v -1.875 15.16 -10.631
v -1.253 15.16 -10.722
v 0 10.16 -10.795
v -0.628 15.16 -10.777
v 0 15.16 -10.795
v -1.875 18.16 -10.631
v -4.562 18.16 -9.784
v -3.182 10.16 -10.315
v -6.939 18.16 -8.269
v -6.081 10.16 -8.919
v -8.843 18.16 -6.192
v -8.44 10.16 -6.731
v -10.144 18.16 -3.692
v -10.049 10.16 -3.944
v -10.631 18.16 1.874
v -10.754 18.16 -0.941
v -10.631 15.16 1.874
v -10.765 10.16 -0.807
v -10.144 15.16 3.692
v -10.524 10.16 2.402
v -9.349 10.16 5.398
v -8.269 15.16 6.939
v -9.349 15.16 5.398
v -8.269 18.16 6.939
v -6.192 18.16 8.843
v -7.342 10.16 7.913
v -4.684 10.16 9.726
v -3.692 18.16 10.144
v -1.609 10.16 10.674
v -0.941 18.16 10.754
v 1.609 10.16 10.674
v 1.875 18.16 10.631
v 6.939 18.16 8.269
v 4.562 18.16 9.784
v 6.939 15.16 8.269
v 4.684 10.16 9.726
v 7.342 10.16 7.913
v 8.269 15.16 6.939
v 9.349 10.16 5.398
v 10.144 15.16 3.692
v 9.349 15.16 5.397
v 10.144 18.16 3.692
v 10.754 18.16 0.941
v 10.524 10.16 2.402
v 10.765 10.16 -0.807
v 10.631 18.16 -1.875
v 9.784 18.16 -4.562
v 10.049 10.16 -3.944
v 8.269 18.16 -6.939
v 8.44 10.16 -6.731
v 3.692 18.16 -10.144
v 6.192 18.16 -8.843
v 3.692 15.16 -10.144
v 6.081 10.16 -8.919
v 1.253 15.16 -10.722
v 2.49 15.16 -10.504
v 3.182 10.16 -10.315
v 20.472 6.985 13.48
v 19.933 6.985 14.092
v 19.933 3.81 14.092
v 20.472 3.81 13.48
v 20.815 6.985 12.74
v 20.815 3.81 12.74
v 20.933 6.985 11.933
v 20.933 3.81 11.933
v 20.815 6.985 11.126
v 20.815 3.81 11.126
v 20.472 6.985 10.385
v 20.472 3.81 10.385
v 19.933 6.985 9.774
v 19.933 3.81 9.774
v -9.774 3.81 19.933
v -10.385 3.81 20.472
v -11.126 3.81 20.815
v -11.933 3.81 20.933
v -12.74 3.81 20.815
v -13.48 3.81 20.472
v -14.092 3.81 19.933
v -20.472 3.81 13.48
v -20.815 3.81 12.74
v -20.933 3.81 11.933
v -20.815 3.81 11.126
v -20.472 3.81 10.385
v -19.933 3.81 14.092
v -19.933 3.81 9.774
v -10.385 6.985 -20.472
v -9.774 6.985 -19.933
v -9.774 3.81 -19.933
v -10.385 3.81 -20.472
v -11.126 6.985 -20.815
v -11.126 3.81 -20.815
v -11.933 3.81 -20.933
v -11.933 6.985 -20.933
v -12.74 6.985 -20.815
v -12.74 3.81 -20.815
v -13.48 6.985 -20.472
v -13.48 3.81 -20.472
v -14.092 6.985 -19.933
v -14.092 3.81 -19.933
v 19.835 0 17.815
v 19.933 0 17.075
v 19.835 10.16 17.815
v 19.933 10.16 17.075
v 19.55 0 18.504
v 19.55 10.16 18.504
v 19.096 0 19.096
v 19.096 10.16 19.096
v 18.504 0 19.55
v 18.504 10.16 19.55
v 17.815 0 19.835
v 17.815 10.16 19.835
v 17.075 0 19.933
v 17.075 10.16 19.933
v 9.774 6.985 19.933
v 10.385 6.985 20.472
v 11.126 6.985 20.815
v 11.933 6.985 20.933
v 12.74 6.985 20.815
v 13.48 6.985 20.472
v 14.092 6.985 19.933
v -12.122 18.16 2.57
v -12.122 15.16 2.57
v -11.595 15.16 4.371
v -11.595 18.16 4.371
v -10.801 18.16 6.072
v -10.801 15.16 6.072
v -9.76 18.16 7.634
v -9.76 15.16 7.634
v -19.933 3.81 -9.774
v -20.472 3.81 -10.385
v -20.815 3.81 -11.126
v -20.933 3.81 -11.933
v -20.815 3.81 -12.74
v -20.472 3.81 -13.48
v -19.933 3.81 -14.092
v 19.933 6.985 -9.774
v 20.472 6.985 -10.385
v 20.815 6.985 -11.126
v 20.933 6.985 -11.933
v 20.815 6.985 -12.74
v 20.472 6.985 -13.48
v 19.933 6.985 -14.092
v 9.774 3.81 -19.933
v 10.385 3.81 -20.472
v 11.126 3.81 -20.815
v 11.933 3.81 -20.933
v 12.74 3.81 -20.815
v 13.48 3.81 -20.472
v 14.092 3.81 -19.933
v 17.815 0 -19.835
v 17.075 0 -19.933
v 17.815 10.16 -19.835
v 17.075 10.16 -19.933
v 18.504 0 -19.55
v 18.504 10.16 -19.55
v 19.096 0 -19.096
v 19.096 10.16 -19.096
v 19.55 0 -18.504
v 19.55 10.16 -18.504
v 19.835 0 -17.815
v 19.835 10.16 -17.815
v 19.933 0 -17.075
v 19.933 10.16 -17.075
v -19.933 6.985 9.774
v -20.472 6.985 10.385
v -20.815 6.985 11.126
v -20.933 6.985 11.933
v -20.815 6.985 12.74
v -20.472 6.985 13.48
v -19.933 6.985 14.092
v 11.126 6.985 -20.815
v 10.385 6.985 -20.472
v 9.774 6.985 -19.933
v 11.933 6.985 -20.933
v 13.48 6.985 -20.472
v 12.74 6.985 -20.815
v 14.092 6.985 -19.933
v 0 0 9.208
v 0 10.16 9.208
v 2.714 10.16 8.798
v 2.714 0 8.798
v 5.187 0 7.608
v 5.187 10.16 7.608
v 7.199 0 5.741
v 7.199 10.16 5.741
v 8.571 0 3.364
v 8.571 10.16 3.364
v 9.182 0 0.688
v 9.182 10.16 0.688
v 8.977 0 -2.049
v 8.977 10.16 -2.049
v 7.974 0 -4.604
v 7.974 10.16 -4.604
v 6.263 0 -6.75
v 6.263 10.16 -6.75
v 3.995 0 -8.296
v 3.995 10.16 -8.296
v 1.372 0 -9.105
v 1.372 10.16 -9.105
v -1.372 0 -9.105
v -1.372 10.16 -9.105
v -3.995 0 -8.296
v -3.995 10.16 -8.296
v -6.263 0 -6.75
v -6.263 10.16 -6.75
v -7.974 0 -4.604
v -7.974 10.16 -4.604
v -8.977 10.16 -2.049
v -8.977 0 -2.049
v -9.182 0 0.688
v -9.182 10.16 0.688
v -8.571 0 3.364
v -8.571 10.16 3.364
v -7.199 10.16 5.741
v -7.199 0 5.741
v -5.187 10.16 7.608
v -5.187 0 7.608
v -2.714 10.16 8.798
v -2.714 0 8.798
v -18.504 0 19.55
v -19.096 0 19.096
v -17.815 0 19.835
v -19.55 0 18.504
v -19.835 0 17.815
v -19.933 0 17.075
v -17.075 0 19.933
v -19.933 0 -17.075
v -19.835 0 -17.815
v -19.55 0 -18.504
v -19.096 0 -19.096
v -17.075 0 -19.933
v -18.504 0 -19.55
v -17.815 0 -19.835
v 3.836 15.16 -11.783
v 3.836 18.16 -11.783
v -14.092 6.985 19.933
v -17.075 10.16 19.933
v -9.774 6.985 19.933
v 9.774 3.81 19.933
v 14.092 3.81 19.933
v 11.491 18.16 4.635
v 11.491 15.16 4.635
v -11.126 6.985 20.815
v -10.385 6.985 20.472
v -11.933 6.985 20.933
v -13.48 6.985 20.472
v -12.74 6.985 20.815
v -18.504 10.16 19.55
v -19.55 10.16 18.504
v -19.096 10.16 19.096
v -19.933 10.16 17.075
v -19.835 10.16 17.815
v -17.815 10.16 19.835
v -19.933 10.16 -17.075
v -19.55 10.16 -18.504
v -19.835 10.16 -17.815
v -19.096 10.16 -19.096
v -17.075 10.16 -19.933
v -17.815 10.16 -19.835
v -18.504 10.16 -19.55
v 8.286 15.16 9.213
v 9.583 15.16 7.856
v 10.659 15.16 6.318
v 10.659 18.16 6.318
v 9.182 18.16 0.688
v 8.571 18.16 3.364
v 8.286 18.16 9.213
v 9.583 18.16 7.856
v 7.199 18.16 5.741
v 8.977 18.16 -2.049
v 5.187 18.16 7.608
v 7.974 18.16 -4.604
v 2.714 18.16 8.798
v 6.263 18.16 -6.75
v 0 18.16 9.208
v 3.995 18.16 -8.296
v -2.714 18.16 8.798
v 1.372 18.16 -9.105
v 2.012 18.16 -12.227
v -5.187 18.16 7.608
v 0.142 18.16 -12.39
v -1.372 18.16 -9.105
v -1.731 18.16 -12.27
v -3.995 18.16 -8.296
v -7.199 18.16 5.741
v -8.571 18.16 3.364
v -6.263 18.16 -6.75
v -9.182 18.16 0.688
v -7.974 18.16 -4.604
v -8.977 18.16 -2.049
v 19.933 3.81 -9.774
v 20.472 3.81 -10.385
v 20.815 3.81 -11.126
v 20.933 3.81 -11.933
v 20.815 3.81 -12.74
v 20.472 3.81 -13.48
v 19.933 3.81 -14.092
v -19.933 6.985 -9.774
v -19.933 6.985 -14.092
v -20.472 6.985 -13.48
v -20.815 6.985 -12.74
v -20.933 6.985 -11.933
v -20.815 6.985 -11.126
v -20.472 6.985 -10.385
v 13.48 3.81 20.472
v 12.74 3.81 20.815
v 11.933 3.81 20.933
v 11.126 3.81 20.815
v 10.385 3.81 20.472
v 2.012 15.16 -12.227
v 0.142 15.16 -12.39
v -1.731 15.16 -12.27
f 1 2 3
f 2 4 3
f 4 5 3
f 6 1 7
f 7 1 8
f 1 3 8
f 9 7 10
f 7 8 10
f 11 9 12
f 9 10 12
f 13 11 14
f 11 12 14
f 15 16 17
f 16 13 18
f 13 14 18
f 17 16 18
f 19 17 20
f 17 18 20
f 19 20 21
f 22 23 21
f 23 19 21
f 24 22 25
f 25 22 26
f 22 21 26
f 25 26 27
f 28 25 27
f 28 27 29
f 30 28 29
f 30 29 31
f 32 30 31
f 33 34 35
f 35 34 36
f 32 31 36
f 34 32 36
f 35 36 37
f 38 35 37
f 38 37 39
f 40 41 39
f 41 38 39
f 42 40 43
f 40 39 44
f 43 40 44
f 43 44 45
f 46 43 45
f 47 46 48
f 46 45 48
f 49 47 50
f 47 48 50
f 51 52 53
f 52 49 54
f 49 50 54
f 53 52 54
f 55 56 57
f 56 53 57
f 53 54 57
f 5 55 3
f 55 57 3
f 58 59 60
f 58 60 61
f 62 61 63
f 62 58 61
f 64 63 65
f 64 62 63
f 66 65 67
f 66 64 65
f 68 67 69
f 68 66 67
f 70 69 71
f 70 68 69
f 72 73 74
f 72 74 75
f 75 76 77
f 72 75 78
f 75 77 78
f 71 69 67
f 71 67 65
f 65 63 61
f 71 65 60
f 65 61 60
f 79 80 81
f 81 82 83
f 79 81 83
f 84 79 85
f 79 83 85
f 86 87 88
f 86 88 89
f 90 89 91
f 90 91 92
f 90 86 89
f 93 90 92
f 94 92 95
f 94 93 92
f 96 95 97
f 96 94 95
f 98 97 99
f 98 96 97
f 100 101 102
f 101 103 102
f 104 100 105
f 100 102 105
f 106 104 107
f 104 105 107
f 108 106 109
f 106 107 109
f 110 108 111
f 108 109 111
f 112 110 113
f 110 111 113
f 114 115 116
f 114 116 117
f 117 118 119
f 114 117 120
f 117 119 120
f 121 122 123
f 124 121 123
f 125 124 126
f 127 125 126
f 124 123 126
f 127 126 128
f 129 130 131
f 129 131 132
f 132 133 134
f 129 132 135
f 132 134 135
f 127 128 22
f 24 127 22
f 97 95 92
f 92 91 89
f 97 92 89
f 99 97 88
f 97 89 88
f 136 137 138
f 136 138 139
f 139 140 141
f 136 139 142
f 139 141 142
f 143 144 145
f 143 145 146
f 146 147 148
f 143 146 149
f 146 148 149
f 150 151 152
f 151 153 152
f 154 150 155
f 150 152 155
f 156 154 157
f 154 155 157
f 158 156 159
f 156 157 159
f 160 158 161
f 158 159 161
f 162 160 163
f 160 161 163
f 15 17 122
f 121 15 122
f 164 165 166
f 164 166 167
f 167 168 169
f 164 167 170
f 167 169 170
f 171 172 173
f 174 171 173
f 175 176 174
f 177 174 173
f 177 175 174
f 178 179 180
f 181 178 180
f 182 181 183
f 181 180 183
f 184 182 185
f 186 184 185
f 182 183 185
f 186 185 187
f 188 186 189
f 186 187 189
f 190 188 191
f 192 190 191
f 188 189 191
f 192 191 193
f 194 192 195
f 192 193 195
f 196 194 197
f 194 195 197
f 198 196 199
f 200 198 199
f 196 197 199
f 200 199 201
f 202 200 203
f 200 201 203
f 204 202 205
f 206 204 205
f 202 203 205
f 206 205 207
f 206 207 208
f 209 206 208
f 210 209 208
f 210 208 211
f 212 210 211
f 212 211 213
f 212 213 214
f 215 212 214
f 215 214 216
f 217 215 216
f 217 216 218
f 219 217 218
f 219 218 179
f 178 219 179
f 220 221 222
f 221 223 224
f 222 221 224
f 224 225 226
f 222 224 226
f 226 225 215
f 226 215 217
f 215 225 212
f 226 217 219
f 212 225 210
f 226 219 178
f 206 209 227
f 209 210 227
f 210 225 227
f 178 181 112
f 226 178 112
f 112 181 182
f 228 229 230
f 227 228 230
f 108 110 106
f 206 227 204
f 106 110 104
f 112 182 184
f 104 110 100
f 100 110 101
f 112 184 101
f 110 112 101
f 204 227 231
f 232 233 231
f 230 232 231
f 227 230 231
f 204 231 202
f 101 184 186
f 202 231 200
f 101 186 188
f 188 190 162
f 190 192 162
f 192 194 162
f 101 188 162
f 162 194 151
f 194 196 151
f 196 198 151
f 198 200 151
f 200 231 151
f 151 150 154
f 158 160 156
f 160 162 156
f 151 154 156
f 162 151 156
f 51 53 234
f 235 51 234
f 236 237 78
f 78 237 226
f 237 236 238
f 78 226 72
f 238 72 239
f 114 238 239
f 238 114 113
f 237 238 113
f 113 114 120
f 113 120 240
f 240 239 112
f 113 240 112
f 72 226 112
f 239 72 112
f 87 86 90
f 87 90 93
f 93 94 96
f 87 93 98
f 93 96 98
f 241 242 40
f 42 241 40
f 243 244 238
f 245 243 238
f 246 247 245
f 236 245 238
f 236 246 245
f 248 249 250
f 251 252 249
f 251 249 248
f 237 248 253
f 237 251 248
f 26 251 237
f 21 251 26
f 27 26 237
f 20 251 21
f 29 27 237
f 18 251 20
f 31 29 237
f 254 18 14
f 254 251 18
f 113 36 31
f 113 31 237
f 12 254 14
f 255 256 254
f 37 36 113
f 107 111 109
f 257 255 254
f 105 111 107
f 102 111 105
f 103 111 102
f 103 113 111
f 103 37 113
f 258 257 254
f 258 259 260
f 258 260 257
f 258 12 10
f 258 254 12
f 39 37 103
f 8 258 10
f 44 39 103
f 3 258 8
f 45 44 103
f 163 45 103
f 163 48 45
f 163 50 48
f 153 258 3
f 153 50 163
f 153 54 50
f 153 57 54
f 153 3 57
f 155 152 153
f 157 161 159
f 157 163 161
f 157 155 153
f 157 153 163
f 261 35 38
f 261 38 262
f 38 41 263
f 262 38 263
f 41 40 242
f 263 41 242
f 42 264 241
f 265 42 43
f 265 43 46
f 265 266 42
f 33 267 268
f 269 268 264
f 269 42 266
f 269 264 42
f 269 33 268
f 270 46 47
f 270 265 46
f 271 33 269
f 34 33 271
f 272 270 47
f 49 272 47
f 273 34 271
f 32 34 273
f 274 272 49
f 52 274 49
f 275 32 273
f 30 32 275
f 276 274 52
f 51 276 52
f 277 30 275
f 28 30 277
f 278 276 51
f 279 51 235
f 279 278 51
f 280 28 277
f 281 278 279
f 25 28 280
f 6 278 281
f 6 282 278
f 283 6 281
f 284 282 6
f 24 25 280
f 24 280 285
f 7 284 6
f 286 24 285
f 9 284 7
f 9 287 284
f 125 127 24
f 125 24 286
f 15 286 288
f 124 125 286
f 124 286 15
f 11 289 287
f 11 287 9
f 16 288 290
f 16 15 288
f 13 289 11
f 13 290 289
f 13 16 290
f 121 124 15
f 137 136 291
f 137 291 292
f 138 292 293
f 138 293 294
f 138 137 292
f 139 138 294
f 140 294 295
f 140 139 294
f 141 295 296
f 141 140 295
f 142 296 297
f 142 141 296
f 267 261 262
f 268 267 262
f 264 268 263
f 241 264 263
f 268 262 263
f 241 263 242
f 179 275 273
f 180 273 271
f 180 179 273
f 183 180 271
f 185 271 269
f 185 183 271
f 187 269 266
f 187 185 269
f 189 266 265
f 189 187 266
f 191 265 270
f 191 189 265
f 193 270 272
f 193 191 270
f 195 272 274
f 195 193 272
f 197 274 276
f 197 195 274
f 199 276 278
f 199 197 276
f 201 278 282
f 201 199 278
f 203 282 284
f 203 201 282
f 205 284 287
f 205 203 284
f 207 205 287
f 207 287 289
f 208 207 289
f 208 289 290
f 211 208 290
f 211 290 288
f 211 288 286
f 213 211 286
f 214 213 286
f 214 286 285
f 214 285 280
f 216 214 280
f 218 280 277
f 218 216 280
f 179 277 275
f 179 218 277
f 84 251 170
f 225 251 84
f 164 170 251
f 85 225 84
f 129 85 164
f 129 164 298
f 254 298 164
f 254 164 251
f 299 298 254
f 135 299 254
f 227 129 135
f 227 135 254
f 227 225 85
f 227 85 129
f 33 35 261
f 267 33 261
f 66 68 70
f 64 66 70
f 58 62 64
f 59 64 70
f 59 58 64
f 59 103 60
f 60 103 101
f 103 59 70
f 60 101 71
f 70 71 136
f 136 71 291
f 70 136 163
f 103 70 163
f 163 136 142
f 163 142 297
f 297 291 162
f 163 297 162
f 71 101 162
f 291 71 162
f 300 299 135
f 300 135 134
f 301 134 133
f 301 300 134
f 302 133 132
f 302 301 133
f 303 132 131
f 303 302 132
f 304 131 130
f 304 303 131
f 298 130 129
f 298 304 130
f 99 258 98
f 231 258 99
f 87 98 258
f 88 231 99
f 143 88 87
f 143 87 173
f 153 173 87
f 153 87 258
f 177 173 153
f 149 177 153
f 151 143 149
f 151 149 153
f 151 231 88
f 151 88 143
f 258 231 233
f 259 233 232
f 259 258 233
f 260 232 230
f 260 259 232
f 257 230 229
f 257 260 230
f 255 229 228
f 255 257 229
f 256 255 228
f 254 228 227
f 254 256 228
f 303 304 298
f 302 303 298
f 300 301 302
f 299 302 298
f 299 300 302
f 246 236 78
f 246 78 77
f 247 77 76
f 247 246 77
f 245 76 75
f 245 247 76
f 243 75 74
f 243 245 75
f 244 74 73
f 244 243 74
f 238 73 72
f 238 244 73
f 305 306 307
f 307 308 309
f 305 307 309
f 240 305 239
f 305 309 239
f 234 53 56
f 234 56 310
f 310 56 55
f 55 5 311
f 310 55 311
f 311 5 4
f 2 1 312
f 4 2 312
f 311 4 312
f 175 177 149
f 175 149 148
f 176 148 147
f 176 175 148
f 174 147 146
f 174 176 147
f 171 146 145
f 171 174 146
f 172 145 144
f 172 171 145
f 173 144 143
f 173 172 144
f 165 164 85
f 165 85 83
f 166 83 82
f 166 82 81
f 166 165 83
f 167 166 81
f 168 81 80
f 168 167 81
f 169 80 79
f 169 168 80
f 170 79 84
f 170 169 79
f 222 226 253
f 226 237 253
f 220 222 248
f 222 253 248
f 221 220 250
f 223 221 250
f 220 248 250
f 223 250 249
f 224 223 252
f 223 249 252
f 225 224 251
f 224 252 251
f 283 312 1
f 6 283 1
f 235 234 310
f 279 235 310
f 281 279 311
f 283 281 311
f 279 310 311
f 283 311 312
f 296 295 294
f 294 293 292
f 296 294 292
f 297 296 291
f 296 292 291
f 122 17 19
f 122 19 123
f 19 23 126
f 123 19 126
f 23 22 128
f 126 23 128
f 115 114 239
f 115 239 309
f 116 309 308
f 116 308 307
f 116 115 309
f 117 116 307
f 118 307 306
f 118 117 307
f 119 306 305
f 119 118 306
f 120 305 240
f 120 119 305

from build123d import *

# Parameters (mm, degrees)
SKETCH1_W           = 39.8655
SKETCH1_H           = 39.8655
BOSS_EXTRUDE1_DEPTH = 10.16
SKETCH2_R           = 10.795
SKETCH2_R_2         = 9.2075
BOSS_EXTRUDE2_DEPTH = 8
BOSS_EXTRUDE3_START = -3
BOSS_EXTRUDE3_DEPTH = 3
CIRPATTERN1_COUNT   = 3
BOSS_EXTRUDE4_DEPTH = 6.35
CUT_EXTRUDE1_DEPTH  = 3.175
FILLET1_R           = 2.8575
SKETCH13_R          = 9.2075
CUT_EXTRUDE2_DEPTH  = 31.638540192
CIRPATTERN2_COUNT   = 4


with BuildPart() as part:
    # Sketch1 → Boss-Extrude1 (new body)
    with BuildSketch(Plane(origin=(0, 0, 0), x_dir=(1, 0, 0), z_dir=(0, 1, 0))):
        Rectangle(SKETCH1_W, SKETCH1_H)
    extrude(amount=BOSS_EXTRUDE1_DEPTH)

    # Sketch2 → Boss-Extrude2 (add)
    with BuildSketch(Plane(origin=(0, 10.16, 0), x_dir=(1, 0, 0), z_dir=(0, 1, 0))):
        Circle(SKETCH2_R)
        Circle(SKETCH2_R_2, mode=Mode.SUBTRACT)
    extrude(amount=BOSS_EXTRUDE2_DEPTH)

    # Sketch5 → Boss-Extrude3 (add)
    with BuildSketch(Plane(origin=(0, 18.16, 0), x_dir=(1, 0, 0), z_dir=(0, 1, 0)).offset(BOSS_EXTRUDE3_START)):
        with BuildLine():
            ThreePointArc((10.143998982, -3.692060354), (8.842746318, -6.19175763), (6.938853856, -8.269481977))
            Line((6.938853856, -8.269481977), (8.286221198, -9.212918747))
            ThreePointArc((8.286221198, -9.212918747), (10.150194049, -7.107242387), (11.491366324, -4.635497124))
            Line((11.491366324, -4.635497124), (10.143998982, -3.692060354))
        make_face()
    boss_extrude3 = extrude(amount=BOSS_EXTRUDE3_DEPTH)

    # CirPattern1: Boss-Extrude3 ×3 about axis
    cirpattern1_axis = Axis((0, 18.16, 0), (0, 1, 0))
    for i in range(1, CIRPATTERN1_COUNT):
        add(boss_extrude3.rotate(cirpattern1_axis, i * 360 / CIRPATTERN1_COUNT))

    # Sketch6 → Boss-Extrude4 (add)
    with BuildSketch(Plane(origin=(0, 10.16, 0), x_dir=(1, 0, 0), z_dir=(0, 1, 0))):
        with BuildLine():
            Line((-14.09175, 19.93275), (-9.77375, 19.93275))
            ThreePointArc((-9.77375, 19.93275), (-11.93275, 20.93275), (-14.09175, 19.93275))
        make_face()
        with BuildLine():
            Line((9.77375, 19.93275), (14.09175, 19.93275))
            ThreePointArc((14.09175, 19.93275), (11.93275, 20.93275), (9.77375, 19.93275))
        make_face()
    boss_extrude4 = extrude(amount=-BOSS_EXTRUDE4_DEPTH)

    # Sketch7 → Cut-Extrude1 (cut)
    with BuildSketch(Plane(origin=(0, 10.16, 0), x_dir=(1, 0, 0), z_dir=(0, 1, 0))):
        with BuildLine():
            Line((-14.09175, 19.93275), (-9.77375, 19.93275))
            ThreePointArc((-9.77375, 19.93275), (-11.93275, 20.93275), (-14.09175, 19.93275))
        make_face()
        with BuildLine():
            ThreePointArc((14.09175, 19.93275), (11.93275, 20.93275), (9.77375, 19.93275))
            Line((9.77375, 19.93275), (14.09175, 19.93275))
        make_face()
    cut_extrude1 = extrude(amount=-CUT_EXTRUDE1_DEPTH, mode=Mode.SUBTRACT)

    # Fillet1
    fillet1_edges = [part.edges().sort_by_distance(p)[0] for p in [
        (-19.93275, 5.08, 19.93275),
        (-19.93275, 5.08, -19.93275),
        (19.93275, 5.08, -19.93275),
        (19.93275, 5.08, 19.93275),
    ]]
    fillet(fillet1_edges, radius=FILLET1_R)

    # Sketch13 → Cut-Extrude2 (cut, through all)
    with BuildSketch(Plane(origin=(0, 10.16, 0), x_dir=(1, 0, 0), z_dir=(0, 1, 0))):
        Circle(SKETCH13_R)
    extrude(amount=-CUT_EXTRUDE2_DEPTH, mode=Mode.SUBTRACT)

    # CirPattern2: Boss-Extrude4, Cut-Extrude1 ×4 about axis
    cirpattern2_axis = Axis((0, 18.16, 0), (0, 1, 0))
    add([boss_extrude4.rotate(cirpattern2_axis, i * 360 / CIRPATTERN2_COUNT) for i in range(1, CIRPATTERN2_COUNT)])
    add([cut_extrude1.rotate(cirpattern2_axis, i * 360 / CIRPATTERN2_COUNT) for i in range(1, CIRPATTERN2_COUNT)], mode=Mode.SUBTRACT)


solid = part.part
